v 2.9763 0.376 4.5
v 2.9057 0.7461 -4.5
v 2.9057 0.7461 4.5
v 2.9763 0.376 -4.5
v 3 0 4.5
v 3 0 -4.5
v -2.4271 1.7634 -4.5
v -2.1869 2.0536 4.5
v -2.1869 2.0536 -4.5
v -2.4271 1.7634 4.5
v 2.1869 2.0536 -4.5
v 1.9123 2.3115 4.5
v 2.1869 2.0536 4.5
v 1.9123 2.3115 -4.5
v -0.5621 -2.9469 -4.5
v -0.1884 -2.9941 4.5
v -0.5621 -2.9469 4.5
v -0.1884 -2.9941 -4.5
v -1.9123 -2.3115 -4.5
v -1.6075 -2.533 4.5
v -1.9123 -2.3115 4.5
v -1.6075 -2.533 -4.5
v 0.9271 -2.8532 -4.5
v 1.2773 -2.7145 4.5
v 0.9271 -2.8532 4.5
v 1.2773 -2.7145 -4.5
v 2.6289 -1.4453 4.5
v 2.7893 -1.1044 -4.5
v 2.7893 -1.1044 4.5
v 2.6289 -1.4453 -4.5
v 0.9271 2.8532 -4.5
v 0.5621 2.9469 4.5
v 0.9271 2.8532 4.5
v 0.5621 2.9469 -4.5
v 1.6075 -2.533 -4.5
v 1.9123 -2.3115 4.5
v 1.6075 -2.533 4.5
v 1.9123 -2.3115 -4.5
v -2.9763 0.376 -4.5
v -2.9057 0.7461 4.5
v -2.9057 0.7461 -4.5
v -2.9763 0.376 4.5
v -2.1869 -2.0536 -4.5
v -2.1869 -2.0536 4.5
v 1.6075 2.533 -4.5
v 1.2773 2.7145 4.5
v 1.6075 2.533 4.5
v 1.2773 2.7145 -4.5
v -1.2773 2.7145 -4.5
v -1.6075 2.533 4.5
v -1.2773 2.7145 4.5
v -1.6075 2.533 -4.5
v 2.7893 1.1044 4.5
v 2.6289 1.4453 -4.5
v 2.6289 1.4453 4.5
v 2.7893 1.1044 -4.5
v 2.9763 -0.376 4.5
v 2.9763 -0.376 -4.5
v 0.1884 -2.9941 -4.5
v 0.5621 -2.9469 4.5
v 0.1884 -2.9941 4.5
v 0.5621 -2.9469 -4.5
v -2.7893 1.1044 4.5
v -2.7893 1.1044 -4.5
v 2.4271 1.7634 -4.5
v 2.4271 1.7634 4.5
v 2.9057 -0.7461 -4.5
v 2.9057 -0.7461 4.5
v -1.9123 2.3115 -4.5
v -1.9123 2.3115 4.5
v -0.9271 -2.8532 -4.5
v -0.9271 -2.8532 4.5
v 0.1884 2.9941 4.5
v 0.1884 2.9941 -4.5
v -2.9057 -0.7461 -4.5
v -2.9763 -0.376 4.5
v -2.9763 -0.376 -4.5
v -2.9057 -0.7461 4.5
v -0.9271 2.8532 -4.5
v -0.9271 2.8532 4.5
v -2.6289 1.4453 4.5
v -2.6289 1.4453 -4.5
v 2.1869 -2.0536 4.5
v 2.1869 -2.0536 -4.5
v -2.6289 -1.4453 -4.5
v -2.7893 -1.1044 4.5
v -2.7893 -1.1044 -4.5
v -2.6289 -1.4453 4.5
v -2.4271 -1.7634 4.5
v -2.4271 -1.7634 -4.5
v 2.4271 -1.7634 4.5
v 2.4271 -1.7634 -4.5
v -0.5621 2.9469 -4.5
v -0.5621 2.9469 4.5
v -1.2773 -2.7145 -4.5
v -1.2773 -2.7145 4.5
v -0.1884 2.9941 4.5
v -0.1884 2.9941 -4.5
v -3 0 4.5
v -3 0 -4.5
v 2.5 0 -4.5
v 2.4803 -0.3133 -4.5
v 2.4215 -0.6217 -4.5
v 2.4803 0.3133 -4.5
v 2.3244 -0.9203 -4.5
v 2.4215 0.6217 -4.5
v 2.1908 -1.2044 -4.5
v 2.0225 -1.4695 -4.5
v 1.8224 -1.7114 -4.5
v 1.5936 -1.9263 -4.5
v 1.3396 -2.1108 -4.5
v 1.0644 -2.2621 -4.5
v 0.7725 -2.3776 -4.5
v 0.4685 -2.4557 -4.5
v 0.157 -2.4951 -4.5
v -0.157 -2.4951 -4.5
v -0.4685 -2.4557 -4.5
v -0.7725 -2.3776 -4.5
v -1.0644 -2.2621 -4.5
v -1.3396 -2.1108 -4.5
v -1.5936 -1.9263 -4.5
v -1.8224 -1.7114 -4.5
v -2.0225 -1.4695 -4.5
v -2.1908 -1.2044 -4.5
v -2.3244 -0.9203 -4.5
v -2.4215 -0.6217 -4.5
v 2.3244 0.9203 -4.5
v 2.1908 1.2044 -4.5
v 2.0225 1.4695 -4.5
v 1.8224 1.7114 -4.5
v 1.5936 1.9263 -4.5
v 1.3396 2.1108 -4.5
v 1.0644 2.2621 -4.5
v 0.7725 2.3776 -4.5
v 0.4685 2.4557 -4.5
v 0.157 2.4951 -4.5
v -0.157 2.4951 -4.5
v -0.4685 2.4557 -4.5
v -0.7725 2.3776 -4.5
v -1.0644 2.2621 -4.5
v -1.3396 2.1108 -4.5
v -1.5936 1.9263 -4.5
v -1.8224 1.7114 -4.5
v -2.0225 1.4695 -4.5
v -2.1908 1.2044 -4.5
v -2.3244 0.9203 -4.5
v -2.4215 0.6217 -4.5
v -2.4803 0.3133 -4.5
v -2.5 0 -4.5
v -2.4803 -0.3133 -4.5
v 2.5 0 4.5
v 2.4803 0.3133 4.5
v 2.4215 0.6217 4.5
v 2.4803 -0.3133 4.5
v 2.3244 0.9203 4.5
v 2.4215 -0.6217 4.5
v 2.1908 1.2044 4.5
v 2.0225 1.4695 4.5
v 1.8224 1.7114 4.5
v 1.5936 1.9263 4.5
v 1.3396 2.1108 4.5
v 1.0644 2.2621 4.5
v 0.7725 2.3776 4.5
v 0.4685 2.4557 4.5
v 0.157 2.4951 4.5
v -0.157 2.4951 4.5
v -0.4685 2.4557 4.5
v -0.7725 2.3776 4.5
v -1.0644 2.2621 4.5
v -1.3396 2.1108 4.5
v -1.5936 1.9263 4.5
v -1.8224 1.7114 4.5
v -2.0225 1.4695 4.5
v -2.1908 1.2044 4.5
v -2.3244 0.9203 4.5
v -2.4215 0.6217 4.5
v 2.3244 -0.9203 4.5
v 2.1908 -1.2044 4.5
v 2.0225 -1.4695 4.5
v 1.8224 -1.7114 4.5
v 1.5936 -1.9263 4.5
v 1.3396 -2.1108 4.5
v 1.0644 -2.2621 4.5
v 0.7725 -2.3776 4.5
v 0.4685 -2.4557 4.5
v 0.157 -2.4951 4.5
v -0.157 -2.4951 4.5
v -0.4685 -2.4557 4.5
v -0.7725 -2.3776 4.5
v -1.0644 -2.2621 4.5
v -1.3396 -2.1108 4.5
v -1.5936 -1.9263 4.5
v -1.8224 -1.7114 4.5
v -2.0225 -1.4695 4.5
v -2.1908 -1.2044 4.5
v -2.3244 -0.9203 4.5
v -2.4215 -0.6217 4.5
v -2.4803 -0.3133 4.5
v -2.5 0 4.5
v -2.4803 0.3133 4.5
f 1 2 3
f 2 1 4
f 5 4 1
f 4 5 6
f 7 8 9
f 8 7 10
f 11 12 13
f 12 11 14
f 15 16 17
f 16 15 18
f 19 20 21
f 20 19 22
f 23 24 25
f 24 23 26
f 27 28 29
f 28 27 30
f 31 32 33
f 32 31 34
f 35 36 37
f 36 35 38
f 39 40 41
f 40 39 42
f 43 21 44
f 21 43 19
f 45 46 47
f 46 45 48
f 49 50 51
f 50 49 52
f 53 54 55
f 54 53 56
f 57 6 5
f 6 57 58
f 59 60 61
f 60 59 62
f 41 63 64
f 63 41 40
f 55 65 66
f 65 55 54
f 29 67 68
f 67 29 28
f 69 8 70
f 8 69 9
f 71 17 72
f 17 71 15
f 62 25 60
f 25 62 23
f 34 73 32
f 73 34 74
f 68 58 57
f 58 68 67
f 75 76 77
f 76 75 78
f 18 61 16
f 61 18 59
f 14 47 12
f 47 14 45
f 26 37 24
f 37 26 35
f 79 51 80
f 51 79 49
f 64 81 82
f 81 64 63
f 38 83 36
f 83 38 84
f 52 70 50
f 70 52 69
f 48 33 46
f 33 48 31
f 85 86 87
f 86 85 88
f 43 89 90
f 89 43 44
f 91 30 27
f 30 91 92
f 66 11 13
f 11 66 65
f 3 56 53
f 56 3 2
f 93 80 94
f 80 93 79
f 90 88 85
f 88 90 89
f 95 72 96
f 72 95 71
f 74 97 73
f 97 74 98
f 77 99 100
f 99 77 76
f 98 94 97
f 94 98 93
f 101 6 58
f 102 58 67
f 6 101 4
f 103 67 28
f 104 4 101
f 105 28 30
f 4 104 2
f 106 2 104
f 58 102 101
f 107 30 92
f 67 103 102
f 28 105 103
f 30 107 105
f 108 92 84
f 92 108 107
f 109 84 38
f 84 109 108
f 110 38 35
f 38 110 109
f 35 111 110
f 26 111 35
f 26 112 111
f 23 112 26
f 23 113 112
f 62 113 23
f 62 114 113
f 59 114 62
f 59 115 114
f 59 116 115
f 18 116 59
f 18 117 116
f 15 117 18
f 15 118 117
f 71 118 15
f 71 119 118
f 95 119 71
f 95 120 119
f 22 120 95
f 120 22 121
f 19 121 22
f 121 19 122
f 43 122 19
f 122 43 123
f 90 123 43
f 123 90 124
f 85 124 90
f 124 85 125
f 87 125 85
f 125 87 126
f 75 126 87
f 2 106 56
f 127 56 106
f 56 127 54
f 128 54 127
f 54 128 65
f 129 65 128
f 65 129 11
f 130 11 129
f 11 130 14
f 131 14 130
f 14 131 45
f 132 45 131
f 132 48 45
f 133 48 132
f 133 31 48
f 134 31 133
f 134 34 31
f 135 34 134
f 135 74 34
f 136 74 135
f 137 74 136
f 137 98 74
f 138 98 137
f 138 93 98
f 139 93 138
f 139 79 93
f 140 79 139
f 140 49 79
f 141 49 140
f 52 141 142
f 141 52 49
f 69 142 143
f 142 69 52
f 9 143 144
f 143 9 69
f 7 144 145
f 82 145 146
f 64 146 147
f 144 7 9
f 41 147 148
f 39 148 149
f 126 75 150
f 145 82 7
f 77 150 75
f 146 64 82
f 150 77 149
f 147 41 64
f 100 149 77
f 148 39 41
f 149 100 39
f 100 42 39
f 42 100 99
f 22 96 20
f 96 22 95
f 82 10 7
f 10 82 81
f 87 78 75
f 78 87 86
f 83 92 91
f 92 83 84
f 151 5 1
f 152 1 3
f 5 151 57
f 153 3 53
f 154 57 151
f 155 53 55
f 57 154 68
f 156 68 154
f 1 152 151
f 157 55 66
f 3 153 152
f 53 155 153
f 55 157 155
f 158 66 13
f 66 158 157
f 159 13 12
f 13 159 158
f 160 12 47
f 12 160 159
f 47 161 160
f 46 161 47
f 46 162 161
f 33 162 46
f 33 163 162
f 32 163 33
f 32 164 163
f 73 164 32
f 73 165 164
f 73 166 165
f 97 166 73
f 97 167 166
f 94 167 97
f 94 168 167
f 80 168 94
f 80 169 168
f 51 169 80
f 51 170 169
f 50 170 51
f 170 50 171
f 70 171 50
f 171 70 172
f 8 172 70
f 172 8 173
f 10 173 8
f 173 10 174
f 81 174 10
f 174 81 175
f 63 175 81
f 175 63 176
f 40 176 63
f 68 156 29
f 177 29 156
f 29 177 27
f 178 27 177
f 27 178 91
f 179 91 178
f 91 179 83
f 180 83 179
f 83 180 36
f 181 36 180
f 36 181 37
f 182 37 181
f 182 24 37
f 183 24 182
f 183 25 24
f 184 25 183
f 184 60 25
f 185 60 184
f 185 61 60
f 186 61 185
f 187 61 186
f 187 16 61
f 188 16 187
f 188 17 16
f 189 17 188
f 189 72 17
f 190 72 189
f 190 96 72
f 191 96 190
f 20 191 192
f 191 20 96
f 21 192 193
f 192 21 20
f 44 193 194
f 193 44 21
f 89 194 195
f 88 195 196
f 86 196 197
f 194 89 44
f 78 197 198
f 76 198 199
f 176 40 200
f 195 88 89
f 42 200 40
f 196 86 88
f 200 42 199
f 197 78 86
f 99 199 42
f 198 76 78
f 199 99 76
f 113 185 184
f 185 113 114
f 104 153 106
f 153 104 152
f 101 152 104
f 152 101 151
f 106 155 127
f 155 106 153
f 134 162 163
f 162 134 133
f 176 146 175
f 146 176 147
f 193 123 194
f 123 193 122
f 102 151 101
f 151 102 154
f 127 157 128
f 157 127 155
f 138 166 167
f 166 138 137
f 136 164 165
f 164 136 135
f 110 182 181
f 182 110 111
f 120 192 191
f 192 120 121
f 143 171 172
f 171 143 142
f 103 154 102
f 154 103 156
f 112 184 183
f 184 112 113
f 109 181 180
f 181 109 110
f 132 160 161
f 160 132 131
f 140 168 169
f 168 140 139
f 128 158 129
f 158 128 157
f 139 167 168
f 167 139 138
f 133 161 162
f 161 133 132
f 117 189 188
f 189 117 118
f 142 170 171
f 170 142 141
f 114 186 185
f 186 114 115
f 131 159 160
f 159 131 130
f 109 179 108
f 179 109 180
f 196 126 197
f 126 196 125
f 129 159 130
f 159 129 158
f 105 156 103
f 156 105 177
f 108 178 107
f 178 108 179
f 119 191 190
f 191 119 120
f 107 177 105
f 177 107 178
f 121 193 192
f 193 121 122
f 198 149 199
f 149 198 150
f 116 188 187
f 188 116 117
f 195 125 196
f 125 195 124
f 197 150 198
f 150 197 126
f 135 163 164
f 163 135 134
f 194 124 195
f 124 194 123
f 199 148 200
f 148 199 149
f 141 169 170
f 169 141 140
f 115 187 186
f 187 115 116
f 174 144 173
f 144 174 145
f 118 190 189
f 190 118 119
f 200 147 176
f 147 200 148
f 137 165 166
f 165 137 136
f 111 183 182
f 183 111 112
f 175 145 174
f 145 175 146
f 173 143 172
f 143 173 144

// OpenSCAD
$fn = 50;


difference() {
	union() {
		translate(v = [0, 0, -4.5000000000]) {
			cylinder(h = 9, r = 3.0000000000);
		}
	}
	union() {
		translate(v = [0, 0, -100.0000000000]) {
			cylinder(h = 200, r = 2.5000000000);
		}
	}
}
